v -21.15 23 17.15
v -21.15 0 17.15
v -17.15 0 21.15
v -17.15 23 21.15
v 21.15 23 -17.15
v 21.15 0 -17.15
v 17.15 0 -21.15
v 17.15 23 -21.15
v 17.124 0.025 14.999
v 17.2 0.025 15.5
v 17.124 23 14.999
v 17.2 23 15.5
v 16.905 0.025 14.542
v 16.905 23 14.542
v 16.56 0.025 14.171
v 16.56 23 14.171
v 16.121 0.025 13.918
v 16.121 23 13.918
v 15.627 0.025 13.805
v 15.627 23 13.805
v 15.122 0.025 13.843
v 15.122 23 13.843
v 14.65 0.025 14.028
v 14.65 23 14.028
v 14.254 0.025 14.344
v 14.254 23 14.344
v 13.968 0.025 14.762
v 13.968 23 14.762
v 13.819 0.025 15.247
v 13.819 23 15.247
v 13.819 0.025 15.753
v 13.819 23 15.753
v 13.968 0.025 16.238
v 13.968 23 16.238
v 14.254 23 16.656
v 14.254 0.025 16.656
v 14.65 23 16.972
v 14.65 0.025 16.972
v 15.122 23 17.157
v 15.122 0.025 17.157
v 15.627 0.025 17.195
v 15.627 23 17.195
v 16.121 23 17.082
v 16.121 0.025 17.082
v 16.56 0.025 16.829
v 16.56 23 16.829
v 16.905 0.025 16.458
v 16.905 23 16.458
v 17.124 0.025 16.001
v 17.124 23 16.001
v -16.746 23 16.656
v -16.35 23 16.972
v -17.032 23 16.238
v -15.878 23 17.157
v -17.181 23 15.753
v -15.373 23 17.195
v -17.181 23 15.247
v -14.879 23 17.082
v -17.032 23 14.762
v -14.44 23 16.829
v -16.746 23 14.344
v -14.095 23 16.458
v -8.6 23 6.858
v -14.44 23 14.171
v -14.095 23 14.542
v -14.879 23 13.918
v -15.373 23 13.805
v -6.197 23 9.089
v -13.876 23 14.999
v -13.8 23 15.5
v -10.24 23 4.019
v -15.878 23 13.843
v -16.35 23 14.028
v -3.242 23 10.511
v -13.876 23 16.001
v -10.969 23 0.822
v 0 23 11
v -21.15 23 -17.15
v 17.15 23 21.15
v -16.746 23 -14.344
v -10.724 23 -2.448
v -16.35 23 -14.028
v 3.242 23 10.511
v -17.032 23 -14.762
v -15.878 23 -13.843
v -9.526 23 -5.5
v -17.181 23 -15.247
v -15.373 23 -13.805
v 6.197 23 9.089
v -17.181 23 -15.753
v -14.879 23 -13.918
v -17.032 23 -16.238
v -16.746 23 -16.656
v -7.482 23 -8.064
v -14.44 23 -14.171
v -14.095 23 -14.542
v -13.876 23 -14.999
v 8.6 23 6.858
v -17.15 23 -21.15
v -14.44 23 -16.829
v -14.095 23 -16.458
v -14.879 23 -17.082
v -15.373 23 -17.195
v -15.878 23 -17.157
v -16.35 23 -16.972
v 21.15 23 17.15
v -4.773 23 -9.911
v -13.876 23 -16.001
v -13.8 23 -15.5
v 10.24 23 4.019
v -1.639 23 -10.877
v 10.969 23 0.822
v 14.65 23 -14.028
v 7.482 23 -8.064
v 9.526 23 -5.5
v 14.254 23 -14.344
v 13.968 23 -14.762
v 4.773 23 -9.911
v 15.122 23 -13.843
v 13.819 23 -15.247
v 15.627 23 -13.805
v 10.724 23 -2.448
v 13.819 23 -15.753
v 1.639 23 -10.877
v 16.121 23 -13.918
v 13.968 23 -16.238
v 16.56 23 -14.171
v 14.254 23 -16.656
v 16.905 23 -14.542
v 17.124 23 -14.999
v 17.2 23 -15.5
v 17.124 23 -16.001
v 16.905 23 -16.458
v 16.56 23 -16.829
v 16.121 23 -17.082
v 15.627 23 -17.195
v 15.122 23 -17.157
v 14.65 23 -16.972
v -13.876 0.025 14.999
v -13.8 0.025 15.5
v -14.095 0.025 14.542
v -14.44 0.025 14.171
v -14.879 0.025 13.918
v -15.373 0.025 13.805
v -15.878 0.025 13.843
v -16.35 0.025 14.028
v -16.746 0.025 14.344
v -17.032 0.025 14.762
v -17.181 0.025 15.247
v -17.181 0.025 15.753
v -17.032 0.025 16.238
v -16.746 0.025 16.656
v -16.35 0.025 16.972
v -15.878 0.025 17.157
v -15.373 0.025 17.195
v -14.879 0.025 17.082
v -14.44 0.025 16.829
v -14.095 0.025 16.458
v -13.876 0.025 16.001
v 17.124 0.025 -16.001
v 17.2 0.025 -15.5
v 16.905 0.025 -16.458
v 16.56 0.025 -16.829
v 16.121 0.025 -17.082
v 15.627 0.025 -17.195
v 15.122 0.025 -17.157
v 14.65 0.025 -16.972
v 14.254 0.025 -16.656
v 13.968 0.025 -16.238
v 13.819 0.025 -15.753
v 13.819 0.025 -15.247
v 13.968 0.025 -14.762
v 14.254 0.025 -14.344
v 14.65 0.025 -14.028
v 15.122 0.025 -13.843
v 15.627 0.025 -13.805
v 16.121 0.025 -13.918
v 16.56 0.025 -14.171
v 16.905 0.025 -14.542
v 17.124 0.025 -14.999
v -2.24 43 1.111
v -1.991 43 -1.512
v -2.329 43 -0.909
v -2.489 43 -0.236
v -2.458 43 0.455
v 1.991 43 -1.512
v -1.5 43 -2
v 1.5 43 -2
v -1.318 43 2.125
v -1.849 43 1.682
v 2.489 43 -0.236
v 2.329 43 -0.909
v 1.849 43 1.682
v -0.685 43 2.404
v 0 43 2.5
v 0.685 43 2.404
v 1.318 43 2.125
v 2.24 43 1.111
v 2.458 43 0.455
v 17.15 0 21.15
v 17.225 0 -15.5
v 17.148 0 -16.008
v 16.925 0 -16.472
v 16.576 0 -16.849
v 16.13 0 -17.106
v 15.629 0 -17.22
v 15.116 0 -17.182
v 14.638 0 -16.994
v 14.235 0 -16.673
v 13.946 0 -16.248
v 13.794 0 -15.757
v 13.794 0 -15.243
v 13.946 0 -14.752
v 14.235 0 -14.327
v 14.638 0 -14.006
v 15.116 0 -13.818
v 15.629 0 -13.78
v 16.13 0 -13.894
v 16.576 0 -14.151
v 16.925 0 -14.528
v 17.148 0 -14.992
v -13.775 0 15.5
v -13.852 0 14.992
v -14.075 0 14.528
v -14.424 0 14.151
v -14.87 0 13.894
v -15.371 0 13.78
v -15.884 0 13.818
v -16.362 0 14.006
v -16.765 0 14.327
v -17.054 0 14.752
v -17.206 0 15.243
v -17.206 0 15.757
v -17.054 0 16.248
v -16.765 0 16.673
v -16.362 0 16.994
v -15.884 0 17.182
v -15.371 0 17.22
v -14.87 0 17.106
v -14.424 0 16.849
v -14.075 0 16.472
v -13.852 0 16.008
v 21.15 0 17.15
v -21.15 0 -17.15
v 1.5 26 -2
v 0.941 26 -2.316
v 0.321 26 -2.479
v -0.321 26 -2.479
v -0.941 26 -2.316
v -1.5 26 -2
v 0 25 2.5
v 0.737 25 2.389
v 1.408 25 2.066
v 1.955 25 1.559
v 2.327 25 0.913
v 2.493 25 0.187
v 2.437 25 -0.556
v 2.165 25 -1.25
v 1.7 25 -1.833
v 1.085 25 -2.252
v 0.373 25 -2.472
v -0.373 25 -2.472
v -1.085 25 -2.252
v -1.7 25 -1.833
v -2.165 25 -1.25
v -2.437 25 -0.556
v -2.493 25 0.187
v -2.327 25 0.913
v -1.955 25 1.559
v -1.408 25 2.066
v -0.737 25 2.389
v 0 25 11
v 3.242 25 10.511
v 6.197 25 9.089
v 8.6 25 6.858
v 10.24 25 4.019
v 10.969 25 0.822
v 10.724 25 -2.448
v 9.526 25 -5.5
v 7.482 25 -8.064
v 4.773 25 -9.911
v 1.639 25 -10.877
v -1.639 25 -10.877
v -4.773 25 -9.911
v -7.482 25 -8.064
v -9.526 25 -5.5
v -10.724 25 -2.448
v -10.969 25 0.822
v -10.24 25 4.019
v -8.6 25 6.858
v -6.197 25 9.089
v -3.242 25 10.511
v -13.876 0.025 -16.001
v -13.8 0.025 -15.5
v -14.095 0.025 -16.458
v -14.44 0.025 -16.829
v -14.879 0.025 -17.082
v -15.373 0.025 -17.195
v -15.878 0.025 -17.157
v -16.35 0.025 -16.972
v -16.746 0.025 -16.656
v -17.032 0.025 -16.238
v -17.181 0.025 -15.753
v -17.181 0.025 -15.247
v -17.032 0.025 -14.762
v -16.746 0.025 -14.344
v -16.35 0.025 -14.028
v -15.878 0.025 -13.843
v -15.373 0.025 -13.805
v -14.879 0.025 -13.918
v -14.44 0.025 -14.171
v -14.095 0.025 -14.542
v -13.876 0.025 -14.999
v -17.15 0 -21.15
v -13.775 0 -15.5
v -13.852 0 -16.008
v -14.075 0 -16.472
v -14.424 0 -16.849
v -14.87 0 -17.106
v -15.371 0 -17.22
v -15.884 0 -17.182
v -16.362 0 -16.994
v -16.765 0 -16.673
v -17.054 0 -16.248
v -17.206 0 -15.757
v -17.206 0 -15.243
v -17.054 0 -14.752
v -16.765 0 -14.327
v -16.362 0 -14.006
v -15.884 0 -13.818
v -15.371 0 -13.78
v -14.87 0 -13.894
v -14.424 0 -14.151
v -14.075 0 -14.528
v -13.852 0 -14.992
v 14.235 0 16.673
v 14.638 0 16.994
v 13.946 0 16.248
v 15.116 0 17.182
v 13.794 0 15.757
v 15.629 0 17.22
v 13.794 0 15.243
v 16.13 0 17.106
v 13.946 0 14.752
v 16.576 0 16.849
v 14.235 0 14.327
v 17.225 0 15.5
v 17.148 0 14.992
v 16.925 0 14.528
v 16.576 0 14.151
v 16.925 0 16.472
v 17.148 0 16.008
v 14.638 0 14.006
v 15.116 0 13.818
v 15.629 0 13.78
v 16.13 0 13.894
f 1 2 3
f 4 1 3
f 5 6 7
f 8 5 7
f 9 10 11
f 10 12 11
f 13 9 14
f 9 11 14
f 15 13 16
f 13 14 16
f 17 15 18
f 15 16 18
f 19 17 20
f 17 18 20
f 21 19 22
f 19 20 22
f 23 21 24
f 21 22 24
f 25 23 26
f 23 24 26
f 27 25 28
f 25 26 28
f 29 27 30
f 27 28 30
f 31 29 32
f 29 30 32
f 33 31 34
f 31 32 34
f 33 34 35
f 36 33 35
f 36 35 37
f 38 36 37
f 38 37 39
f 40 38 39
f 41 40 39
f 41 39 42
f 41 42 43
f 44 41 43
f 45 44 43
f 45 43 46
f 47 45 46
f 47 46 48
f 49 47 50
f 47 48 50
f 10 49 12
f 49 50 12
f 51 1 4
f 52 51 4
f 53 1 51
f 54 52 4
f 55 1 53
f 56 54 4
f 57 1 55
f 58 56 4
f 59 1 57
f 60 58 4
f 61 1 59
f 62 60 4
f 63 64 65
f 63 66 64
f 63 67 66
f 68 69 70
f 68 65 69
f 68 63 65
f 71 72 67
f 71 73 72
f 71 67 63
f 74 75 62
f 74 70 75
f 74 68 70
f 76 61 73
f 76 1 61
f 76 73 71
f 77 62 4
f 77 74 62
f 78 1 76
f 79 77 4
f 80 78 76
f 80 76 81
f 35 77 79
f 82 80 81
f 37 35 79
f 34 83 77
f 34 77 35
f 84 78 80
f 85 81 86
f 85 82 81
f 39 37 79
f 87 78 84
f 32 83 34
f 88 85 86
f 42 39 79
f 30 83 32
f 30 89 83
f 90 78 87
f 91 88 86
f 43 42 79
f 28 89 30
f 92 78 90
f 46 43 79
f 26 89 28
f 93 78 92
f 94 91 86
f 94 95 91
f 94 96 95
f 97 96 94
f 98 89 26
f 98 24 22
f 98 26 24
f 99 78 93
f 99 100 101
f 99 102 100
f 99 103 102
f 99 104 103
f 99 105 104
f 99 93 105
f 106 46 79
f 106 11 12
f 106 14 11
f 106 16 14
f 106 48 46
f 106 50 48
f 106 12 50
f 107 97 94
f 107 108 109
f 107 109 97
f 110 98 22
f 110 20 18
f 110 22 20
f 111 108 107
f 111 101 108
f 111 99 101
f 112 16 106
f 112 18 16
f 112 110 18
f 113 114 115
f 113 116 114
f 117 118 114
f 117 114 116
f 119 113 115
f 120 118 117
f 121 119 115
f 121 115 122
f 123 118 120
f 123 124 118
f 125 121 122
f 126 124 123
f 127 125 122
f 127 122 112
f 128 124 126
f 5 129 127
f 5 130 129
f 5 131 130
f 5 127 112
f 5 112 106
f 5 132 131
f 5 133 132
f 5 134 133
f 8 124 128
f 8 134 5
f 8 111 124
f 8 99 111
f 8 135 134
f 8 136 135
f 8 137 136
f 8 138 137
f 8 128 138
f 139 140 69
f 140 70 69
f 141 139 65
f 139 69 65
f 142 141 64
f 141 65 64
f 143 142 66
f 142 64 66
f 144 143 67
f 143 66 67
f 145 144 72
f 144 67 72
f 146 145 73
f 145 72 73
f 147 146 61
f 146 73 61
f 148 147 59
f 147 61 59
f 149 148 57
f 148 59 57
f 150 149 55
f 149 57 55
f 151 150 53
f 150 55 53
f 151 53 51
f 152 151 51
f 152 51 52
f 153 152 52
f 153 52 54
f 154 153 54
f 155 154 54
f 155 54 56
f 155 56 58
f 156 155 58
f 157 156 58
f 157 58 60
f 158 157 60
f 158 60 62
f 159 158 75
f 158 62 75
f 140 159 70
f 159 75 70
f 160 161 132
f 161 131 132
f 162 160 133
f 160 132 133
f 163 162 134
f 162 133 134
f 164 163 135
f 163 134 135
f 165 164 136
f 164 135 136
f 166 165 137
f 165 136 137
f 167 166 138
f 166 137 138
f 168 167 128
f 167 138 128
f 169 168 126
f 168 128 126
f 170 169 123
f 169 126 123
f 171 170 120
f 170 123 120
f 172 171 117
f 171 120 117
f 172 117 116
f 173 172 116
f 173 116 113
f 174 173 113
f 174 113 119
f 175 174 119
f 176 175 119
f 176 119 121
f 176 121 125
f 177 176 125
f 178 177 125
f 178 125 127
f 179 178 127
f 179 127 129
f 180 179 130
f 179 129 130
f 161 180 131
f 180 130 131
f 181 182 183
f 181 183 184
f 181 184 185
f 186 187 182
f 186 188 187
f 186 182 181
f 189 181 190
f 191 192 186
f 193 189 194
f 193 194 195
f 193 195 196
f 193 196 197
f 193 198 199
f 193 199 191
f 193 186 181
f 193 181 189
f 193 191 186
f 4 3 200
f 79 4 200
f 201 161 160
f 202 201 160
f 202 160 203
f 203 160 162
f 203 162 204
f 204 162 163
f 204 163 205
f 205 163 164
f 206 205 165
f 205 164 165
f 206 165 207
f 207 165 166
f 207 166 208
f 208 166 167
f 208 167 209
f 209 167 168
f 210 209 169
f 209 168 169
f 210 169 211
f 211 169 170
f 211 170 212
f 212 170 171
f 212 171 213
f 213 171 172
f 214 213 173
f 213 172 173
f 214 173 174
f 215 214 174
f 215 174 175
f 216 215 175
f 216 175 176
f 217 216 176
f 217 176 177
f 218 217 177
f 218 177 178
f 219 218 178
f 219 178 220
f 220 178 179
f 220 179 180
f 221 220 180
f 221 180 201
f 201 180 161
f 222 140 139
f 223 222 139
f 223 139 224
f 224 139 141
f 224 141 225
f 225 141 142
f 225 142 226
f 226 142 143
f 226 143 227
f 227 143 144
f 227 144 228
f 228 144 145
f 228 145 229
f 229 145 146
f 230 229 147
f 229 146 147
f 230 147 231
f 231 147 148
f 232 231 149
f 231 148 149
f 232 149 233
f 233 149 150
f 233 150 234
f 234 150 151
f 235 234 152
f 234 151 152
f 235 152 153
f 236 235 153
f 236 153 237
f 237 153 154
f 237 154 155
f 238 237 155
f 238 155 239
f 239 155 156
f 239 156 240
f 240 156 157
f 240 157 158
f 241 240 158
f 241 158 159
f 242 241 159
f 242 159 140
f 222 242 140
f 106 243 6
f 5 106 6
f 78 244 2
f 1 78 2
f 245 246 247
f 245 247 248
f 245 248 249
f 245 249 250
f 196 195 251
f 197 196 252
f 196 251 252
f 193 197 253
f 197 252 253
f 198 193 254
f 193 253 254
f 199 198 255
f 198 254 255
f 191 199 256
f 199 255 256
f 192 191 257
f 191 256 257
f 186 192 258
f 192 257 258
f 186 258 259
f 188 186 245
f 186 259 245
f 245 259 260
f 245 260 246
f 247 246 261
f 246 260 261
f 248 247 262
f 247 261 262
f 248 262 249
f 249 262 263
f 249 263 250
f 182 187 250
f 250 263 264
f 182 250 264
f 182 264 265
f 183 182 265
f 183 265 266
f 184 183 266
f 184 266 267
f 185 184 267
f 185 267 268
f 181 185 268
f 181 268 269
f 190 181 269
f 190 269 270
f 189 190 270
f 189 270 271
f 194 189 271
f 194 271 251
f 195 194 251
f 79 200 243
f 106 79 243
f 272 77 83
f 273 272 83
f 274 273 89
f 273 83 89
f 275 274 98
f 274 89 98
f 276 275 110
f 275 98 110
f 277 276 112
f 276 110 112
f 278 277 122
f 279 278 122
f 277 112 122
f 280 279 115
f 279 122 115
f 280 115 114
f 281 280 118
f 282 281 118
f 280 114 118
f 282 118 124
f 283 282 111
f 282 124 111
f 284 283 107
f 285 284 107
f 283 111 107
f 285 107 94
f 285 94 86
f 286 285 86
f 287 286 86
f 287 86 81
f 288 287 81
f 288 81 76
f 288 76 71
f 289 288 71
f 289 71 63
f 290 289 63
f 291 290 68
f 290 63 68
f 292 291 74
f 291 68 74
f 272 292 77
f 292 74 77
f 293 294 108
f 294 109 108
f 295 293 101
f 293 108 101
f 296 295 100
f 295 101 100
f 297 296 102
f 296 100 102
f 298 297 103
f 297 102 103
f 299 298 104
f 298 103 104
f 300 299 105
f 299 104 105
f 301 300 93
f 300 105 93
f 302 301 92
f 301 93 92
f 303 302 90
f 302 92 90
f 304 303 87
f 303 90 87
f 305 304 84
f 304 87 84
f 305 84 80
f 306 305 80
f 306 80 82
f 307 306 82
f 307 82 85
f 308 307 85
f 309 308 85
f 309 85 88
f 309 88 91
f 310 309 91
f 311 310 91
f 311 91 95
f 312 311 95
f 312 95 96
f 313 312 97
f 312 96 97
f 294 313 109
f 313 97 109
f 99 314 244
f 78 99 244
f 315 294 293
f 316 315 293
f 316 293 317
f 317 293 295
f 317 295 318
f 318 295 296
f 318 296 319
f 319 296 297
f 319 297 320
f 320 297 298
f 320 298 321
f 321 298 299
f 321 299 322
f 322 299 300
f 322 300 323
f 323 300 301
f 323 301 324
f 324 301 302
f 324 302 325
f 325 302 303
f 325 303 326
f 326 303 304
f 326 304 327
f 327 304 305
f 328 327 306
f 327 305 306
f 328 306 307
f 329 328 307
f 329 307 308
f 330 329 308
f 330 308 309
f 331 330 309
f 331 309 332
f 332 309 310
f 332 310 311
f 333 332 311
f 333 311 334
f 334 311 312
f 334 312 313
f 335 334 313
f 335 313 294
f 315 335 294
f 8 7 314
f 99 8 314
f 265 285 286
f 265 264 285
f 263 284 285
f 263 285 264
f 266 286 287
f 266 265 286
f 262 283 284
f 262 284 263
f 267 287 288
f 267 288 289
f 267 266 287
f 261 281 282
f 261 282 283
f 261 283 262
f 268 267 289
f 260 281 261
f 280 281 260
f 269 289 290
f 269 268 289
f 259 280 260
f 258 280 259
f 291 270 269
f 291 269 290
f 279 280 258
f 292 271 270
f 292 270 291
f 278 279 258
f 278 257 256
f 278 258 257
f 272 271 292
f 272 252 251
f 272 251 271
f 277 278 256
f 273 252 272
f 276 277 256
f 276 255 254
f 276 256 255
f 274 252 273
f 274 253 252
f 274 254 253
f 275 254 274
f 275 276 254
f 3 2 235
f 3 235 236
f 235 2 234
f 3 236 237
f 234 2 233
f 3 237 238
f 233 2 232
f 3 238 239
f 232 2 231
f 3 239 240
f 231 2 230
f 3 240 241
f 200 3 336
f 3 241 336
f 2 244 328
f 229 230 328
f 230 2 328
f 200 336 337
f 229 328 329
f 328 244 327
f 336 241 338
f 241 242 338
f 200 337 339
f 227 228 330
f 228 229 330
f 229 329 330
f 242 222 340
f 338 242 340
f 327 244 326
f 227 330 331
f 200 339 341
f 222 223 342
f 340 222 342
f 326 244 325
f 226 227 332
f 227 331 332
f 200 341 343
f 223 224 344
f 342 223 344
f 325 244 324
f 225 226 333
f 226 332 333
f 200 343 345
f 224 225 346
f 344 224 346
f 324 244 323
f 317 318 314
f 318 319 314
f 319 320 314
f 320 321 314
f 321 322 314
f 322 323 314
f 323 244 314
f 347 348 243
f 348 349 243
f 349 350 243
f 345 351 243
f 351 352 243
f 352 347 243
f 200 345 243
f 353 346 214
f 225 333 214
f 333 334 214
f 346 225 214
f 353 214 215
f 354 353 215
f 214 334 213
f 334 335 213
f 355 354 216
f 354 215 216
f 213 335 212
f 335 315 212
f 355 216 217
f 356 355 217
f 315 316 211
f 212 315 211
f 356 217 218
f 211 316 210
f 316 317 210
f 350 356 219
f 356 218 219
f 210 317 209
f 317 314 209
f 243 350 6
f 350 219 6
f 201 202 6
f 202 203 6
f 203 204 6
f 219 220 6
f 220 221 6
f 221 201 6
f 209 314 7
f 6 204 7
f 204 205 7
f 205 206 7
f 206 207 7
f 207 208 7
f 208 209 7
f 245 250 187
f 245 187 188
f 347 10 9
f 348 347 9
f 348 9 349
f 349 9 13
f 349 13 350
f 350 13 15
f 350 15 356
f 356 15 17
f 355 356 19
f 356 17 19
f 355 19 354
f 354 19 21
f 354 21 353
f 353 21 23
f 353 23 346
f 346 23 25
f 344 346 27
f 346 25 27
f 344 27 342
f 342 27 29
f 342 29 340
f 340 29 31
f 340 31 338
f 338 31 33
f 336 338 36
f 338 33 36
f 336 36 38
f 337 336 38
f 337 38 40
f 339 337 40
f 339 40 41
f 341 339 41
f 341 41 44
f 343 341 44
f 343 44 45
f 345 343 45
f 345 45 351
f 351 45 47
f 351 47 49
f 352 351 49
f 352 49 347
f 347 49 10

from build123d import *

# Parameters (mm, degrees)
ESTRUSIONE_ESTRUSIONE1_DEPTH   = 23
FORO_PER_VITE_M3_1_D           = 3.4
FORO_PER_VITE_M3_1_DEPTH       = 34
FORO_PER_VITE_M3_1_CSINK_D     = 3.45
FORO_PER_VITE_M3_1_CSINK_ANGLE = 90
FORO_PER_VITE_M3_1_TIP         = 1.021463052
SCHIZZO5_R                     = 11
ESTRUSIONE_ESTRUSIONE2_DEPTH   = 2
SCHIZZO6_R                     = 2.5
ESTRUSIONE_ESTRUSIONE3_DEPTH   = 18
TAGLIO_ESTRUSIONE1_START       = -17
TAGLIO_ESTRUSIONE1_DEPTH       = 17


with BuildPart() as part:
    # Schizzo1 → Estrusione-Estrusione1 (new body)
    with BuildSketch(Plane(origin=(0, 0, 0), x_dir=(1, 0, 0), z_dir=(0, 1, 0))):
        Polygon((21.15, -17.15), (21.15, 17.15), (17.15, 21.15), (-17.15, 21.15), (-21.15, 17.15), (-21.15, -17.15), (-17.15, -21.15), (17.15, -21.15), align=None)
    extrude(amount=ESTRUSIONE_ESTRUSIONE1_DEPTH)

    # Foro per Vite M3-1
    with Locations(Plane(origin=(0, 0, 0), x_dir=(-1, 0, 0), z_dir=(0, -1, 0))):
        with Locations((-15.5, 15.5), (15.5, 15.5), (15.5, -15.5), (-15.5, -15.5)):
            CounterSinkHole(FORO_PER_VITE_M3_1_D / 2, FORO_PER_VITE_M3_1_CSINK_D / 2, depth=FORO_PER_VITE_M3_1_DEPTH, counter_sink_angle=FORO_PER_VITE_M3_1_CSINK_ANGLE)
            with Locations((0, 0, -(FORO_PER_VITE_M3_1_DEPTH + FORO_PER_VITE_M3_1_TIP / 2))):  # 118° drill point
                Cone(0, FORO_PER_VITE_M3_1_D / 2, FORO_PER_VITE_M3_1_TIP, mode=Mode.SUBTRACT)

    # Schizzo5 → Estrusione-Estrusione2 (add)
    with BuildSketch(Plane(origin=(0, 23, 0), x_dir=(1, 0, 0), z_dir=(0, 1, 0))):
        with Locations(Location((0, 0, 0), (0, 0, 270))):
            Circle(SCHIZZO5_R)
    extrude(amount=ESTRUSIONE_ESTRUSIONE2_DEPTH)

    # Schizzo6 → Estrusione-Estrusione3 (add)
    with BuildSketch(Plane(origin=(0, 25, 0), x_dir=(1, 0, 0), z_dir=(0, 1, 0))):
        with Locations(Location((0, 0, 0), (0, 0, 270))):
            Circle(SCHIZZO6_R)
    extrude(amount=ESTRUSIONE_ESTRUSIONE3_DEPTH)

    # Schizzo7 → Taglio-Estrusione1 (cut)
    with BuildSketch(Plane(origin=(0, 43, 0), x_dir=(1, 0, 0), z_dir=(0, 1, 0)).offset(TAGLIO_ESTRUSIONE1_START)):
        with BuildLine():
            Line((-1.5, 2), (1.5, 2))
            ThreePointArc((1.5, 2), (0, 2.5), (-1.5, 2))
        make_face()
    extrude(amount=TAGLIO_ESTRUSIONE1_DEPTH, mode=Mode.SUBTRACT)


solid = part.part
